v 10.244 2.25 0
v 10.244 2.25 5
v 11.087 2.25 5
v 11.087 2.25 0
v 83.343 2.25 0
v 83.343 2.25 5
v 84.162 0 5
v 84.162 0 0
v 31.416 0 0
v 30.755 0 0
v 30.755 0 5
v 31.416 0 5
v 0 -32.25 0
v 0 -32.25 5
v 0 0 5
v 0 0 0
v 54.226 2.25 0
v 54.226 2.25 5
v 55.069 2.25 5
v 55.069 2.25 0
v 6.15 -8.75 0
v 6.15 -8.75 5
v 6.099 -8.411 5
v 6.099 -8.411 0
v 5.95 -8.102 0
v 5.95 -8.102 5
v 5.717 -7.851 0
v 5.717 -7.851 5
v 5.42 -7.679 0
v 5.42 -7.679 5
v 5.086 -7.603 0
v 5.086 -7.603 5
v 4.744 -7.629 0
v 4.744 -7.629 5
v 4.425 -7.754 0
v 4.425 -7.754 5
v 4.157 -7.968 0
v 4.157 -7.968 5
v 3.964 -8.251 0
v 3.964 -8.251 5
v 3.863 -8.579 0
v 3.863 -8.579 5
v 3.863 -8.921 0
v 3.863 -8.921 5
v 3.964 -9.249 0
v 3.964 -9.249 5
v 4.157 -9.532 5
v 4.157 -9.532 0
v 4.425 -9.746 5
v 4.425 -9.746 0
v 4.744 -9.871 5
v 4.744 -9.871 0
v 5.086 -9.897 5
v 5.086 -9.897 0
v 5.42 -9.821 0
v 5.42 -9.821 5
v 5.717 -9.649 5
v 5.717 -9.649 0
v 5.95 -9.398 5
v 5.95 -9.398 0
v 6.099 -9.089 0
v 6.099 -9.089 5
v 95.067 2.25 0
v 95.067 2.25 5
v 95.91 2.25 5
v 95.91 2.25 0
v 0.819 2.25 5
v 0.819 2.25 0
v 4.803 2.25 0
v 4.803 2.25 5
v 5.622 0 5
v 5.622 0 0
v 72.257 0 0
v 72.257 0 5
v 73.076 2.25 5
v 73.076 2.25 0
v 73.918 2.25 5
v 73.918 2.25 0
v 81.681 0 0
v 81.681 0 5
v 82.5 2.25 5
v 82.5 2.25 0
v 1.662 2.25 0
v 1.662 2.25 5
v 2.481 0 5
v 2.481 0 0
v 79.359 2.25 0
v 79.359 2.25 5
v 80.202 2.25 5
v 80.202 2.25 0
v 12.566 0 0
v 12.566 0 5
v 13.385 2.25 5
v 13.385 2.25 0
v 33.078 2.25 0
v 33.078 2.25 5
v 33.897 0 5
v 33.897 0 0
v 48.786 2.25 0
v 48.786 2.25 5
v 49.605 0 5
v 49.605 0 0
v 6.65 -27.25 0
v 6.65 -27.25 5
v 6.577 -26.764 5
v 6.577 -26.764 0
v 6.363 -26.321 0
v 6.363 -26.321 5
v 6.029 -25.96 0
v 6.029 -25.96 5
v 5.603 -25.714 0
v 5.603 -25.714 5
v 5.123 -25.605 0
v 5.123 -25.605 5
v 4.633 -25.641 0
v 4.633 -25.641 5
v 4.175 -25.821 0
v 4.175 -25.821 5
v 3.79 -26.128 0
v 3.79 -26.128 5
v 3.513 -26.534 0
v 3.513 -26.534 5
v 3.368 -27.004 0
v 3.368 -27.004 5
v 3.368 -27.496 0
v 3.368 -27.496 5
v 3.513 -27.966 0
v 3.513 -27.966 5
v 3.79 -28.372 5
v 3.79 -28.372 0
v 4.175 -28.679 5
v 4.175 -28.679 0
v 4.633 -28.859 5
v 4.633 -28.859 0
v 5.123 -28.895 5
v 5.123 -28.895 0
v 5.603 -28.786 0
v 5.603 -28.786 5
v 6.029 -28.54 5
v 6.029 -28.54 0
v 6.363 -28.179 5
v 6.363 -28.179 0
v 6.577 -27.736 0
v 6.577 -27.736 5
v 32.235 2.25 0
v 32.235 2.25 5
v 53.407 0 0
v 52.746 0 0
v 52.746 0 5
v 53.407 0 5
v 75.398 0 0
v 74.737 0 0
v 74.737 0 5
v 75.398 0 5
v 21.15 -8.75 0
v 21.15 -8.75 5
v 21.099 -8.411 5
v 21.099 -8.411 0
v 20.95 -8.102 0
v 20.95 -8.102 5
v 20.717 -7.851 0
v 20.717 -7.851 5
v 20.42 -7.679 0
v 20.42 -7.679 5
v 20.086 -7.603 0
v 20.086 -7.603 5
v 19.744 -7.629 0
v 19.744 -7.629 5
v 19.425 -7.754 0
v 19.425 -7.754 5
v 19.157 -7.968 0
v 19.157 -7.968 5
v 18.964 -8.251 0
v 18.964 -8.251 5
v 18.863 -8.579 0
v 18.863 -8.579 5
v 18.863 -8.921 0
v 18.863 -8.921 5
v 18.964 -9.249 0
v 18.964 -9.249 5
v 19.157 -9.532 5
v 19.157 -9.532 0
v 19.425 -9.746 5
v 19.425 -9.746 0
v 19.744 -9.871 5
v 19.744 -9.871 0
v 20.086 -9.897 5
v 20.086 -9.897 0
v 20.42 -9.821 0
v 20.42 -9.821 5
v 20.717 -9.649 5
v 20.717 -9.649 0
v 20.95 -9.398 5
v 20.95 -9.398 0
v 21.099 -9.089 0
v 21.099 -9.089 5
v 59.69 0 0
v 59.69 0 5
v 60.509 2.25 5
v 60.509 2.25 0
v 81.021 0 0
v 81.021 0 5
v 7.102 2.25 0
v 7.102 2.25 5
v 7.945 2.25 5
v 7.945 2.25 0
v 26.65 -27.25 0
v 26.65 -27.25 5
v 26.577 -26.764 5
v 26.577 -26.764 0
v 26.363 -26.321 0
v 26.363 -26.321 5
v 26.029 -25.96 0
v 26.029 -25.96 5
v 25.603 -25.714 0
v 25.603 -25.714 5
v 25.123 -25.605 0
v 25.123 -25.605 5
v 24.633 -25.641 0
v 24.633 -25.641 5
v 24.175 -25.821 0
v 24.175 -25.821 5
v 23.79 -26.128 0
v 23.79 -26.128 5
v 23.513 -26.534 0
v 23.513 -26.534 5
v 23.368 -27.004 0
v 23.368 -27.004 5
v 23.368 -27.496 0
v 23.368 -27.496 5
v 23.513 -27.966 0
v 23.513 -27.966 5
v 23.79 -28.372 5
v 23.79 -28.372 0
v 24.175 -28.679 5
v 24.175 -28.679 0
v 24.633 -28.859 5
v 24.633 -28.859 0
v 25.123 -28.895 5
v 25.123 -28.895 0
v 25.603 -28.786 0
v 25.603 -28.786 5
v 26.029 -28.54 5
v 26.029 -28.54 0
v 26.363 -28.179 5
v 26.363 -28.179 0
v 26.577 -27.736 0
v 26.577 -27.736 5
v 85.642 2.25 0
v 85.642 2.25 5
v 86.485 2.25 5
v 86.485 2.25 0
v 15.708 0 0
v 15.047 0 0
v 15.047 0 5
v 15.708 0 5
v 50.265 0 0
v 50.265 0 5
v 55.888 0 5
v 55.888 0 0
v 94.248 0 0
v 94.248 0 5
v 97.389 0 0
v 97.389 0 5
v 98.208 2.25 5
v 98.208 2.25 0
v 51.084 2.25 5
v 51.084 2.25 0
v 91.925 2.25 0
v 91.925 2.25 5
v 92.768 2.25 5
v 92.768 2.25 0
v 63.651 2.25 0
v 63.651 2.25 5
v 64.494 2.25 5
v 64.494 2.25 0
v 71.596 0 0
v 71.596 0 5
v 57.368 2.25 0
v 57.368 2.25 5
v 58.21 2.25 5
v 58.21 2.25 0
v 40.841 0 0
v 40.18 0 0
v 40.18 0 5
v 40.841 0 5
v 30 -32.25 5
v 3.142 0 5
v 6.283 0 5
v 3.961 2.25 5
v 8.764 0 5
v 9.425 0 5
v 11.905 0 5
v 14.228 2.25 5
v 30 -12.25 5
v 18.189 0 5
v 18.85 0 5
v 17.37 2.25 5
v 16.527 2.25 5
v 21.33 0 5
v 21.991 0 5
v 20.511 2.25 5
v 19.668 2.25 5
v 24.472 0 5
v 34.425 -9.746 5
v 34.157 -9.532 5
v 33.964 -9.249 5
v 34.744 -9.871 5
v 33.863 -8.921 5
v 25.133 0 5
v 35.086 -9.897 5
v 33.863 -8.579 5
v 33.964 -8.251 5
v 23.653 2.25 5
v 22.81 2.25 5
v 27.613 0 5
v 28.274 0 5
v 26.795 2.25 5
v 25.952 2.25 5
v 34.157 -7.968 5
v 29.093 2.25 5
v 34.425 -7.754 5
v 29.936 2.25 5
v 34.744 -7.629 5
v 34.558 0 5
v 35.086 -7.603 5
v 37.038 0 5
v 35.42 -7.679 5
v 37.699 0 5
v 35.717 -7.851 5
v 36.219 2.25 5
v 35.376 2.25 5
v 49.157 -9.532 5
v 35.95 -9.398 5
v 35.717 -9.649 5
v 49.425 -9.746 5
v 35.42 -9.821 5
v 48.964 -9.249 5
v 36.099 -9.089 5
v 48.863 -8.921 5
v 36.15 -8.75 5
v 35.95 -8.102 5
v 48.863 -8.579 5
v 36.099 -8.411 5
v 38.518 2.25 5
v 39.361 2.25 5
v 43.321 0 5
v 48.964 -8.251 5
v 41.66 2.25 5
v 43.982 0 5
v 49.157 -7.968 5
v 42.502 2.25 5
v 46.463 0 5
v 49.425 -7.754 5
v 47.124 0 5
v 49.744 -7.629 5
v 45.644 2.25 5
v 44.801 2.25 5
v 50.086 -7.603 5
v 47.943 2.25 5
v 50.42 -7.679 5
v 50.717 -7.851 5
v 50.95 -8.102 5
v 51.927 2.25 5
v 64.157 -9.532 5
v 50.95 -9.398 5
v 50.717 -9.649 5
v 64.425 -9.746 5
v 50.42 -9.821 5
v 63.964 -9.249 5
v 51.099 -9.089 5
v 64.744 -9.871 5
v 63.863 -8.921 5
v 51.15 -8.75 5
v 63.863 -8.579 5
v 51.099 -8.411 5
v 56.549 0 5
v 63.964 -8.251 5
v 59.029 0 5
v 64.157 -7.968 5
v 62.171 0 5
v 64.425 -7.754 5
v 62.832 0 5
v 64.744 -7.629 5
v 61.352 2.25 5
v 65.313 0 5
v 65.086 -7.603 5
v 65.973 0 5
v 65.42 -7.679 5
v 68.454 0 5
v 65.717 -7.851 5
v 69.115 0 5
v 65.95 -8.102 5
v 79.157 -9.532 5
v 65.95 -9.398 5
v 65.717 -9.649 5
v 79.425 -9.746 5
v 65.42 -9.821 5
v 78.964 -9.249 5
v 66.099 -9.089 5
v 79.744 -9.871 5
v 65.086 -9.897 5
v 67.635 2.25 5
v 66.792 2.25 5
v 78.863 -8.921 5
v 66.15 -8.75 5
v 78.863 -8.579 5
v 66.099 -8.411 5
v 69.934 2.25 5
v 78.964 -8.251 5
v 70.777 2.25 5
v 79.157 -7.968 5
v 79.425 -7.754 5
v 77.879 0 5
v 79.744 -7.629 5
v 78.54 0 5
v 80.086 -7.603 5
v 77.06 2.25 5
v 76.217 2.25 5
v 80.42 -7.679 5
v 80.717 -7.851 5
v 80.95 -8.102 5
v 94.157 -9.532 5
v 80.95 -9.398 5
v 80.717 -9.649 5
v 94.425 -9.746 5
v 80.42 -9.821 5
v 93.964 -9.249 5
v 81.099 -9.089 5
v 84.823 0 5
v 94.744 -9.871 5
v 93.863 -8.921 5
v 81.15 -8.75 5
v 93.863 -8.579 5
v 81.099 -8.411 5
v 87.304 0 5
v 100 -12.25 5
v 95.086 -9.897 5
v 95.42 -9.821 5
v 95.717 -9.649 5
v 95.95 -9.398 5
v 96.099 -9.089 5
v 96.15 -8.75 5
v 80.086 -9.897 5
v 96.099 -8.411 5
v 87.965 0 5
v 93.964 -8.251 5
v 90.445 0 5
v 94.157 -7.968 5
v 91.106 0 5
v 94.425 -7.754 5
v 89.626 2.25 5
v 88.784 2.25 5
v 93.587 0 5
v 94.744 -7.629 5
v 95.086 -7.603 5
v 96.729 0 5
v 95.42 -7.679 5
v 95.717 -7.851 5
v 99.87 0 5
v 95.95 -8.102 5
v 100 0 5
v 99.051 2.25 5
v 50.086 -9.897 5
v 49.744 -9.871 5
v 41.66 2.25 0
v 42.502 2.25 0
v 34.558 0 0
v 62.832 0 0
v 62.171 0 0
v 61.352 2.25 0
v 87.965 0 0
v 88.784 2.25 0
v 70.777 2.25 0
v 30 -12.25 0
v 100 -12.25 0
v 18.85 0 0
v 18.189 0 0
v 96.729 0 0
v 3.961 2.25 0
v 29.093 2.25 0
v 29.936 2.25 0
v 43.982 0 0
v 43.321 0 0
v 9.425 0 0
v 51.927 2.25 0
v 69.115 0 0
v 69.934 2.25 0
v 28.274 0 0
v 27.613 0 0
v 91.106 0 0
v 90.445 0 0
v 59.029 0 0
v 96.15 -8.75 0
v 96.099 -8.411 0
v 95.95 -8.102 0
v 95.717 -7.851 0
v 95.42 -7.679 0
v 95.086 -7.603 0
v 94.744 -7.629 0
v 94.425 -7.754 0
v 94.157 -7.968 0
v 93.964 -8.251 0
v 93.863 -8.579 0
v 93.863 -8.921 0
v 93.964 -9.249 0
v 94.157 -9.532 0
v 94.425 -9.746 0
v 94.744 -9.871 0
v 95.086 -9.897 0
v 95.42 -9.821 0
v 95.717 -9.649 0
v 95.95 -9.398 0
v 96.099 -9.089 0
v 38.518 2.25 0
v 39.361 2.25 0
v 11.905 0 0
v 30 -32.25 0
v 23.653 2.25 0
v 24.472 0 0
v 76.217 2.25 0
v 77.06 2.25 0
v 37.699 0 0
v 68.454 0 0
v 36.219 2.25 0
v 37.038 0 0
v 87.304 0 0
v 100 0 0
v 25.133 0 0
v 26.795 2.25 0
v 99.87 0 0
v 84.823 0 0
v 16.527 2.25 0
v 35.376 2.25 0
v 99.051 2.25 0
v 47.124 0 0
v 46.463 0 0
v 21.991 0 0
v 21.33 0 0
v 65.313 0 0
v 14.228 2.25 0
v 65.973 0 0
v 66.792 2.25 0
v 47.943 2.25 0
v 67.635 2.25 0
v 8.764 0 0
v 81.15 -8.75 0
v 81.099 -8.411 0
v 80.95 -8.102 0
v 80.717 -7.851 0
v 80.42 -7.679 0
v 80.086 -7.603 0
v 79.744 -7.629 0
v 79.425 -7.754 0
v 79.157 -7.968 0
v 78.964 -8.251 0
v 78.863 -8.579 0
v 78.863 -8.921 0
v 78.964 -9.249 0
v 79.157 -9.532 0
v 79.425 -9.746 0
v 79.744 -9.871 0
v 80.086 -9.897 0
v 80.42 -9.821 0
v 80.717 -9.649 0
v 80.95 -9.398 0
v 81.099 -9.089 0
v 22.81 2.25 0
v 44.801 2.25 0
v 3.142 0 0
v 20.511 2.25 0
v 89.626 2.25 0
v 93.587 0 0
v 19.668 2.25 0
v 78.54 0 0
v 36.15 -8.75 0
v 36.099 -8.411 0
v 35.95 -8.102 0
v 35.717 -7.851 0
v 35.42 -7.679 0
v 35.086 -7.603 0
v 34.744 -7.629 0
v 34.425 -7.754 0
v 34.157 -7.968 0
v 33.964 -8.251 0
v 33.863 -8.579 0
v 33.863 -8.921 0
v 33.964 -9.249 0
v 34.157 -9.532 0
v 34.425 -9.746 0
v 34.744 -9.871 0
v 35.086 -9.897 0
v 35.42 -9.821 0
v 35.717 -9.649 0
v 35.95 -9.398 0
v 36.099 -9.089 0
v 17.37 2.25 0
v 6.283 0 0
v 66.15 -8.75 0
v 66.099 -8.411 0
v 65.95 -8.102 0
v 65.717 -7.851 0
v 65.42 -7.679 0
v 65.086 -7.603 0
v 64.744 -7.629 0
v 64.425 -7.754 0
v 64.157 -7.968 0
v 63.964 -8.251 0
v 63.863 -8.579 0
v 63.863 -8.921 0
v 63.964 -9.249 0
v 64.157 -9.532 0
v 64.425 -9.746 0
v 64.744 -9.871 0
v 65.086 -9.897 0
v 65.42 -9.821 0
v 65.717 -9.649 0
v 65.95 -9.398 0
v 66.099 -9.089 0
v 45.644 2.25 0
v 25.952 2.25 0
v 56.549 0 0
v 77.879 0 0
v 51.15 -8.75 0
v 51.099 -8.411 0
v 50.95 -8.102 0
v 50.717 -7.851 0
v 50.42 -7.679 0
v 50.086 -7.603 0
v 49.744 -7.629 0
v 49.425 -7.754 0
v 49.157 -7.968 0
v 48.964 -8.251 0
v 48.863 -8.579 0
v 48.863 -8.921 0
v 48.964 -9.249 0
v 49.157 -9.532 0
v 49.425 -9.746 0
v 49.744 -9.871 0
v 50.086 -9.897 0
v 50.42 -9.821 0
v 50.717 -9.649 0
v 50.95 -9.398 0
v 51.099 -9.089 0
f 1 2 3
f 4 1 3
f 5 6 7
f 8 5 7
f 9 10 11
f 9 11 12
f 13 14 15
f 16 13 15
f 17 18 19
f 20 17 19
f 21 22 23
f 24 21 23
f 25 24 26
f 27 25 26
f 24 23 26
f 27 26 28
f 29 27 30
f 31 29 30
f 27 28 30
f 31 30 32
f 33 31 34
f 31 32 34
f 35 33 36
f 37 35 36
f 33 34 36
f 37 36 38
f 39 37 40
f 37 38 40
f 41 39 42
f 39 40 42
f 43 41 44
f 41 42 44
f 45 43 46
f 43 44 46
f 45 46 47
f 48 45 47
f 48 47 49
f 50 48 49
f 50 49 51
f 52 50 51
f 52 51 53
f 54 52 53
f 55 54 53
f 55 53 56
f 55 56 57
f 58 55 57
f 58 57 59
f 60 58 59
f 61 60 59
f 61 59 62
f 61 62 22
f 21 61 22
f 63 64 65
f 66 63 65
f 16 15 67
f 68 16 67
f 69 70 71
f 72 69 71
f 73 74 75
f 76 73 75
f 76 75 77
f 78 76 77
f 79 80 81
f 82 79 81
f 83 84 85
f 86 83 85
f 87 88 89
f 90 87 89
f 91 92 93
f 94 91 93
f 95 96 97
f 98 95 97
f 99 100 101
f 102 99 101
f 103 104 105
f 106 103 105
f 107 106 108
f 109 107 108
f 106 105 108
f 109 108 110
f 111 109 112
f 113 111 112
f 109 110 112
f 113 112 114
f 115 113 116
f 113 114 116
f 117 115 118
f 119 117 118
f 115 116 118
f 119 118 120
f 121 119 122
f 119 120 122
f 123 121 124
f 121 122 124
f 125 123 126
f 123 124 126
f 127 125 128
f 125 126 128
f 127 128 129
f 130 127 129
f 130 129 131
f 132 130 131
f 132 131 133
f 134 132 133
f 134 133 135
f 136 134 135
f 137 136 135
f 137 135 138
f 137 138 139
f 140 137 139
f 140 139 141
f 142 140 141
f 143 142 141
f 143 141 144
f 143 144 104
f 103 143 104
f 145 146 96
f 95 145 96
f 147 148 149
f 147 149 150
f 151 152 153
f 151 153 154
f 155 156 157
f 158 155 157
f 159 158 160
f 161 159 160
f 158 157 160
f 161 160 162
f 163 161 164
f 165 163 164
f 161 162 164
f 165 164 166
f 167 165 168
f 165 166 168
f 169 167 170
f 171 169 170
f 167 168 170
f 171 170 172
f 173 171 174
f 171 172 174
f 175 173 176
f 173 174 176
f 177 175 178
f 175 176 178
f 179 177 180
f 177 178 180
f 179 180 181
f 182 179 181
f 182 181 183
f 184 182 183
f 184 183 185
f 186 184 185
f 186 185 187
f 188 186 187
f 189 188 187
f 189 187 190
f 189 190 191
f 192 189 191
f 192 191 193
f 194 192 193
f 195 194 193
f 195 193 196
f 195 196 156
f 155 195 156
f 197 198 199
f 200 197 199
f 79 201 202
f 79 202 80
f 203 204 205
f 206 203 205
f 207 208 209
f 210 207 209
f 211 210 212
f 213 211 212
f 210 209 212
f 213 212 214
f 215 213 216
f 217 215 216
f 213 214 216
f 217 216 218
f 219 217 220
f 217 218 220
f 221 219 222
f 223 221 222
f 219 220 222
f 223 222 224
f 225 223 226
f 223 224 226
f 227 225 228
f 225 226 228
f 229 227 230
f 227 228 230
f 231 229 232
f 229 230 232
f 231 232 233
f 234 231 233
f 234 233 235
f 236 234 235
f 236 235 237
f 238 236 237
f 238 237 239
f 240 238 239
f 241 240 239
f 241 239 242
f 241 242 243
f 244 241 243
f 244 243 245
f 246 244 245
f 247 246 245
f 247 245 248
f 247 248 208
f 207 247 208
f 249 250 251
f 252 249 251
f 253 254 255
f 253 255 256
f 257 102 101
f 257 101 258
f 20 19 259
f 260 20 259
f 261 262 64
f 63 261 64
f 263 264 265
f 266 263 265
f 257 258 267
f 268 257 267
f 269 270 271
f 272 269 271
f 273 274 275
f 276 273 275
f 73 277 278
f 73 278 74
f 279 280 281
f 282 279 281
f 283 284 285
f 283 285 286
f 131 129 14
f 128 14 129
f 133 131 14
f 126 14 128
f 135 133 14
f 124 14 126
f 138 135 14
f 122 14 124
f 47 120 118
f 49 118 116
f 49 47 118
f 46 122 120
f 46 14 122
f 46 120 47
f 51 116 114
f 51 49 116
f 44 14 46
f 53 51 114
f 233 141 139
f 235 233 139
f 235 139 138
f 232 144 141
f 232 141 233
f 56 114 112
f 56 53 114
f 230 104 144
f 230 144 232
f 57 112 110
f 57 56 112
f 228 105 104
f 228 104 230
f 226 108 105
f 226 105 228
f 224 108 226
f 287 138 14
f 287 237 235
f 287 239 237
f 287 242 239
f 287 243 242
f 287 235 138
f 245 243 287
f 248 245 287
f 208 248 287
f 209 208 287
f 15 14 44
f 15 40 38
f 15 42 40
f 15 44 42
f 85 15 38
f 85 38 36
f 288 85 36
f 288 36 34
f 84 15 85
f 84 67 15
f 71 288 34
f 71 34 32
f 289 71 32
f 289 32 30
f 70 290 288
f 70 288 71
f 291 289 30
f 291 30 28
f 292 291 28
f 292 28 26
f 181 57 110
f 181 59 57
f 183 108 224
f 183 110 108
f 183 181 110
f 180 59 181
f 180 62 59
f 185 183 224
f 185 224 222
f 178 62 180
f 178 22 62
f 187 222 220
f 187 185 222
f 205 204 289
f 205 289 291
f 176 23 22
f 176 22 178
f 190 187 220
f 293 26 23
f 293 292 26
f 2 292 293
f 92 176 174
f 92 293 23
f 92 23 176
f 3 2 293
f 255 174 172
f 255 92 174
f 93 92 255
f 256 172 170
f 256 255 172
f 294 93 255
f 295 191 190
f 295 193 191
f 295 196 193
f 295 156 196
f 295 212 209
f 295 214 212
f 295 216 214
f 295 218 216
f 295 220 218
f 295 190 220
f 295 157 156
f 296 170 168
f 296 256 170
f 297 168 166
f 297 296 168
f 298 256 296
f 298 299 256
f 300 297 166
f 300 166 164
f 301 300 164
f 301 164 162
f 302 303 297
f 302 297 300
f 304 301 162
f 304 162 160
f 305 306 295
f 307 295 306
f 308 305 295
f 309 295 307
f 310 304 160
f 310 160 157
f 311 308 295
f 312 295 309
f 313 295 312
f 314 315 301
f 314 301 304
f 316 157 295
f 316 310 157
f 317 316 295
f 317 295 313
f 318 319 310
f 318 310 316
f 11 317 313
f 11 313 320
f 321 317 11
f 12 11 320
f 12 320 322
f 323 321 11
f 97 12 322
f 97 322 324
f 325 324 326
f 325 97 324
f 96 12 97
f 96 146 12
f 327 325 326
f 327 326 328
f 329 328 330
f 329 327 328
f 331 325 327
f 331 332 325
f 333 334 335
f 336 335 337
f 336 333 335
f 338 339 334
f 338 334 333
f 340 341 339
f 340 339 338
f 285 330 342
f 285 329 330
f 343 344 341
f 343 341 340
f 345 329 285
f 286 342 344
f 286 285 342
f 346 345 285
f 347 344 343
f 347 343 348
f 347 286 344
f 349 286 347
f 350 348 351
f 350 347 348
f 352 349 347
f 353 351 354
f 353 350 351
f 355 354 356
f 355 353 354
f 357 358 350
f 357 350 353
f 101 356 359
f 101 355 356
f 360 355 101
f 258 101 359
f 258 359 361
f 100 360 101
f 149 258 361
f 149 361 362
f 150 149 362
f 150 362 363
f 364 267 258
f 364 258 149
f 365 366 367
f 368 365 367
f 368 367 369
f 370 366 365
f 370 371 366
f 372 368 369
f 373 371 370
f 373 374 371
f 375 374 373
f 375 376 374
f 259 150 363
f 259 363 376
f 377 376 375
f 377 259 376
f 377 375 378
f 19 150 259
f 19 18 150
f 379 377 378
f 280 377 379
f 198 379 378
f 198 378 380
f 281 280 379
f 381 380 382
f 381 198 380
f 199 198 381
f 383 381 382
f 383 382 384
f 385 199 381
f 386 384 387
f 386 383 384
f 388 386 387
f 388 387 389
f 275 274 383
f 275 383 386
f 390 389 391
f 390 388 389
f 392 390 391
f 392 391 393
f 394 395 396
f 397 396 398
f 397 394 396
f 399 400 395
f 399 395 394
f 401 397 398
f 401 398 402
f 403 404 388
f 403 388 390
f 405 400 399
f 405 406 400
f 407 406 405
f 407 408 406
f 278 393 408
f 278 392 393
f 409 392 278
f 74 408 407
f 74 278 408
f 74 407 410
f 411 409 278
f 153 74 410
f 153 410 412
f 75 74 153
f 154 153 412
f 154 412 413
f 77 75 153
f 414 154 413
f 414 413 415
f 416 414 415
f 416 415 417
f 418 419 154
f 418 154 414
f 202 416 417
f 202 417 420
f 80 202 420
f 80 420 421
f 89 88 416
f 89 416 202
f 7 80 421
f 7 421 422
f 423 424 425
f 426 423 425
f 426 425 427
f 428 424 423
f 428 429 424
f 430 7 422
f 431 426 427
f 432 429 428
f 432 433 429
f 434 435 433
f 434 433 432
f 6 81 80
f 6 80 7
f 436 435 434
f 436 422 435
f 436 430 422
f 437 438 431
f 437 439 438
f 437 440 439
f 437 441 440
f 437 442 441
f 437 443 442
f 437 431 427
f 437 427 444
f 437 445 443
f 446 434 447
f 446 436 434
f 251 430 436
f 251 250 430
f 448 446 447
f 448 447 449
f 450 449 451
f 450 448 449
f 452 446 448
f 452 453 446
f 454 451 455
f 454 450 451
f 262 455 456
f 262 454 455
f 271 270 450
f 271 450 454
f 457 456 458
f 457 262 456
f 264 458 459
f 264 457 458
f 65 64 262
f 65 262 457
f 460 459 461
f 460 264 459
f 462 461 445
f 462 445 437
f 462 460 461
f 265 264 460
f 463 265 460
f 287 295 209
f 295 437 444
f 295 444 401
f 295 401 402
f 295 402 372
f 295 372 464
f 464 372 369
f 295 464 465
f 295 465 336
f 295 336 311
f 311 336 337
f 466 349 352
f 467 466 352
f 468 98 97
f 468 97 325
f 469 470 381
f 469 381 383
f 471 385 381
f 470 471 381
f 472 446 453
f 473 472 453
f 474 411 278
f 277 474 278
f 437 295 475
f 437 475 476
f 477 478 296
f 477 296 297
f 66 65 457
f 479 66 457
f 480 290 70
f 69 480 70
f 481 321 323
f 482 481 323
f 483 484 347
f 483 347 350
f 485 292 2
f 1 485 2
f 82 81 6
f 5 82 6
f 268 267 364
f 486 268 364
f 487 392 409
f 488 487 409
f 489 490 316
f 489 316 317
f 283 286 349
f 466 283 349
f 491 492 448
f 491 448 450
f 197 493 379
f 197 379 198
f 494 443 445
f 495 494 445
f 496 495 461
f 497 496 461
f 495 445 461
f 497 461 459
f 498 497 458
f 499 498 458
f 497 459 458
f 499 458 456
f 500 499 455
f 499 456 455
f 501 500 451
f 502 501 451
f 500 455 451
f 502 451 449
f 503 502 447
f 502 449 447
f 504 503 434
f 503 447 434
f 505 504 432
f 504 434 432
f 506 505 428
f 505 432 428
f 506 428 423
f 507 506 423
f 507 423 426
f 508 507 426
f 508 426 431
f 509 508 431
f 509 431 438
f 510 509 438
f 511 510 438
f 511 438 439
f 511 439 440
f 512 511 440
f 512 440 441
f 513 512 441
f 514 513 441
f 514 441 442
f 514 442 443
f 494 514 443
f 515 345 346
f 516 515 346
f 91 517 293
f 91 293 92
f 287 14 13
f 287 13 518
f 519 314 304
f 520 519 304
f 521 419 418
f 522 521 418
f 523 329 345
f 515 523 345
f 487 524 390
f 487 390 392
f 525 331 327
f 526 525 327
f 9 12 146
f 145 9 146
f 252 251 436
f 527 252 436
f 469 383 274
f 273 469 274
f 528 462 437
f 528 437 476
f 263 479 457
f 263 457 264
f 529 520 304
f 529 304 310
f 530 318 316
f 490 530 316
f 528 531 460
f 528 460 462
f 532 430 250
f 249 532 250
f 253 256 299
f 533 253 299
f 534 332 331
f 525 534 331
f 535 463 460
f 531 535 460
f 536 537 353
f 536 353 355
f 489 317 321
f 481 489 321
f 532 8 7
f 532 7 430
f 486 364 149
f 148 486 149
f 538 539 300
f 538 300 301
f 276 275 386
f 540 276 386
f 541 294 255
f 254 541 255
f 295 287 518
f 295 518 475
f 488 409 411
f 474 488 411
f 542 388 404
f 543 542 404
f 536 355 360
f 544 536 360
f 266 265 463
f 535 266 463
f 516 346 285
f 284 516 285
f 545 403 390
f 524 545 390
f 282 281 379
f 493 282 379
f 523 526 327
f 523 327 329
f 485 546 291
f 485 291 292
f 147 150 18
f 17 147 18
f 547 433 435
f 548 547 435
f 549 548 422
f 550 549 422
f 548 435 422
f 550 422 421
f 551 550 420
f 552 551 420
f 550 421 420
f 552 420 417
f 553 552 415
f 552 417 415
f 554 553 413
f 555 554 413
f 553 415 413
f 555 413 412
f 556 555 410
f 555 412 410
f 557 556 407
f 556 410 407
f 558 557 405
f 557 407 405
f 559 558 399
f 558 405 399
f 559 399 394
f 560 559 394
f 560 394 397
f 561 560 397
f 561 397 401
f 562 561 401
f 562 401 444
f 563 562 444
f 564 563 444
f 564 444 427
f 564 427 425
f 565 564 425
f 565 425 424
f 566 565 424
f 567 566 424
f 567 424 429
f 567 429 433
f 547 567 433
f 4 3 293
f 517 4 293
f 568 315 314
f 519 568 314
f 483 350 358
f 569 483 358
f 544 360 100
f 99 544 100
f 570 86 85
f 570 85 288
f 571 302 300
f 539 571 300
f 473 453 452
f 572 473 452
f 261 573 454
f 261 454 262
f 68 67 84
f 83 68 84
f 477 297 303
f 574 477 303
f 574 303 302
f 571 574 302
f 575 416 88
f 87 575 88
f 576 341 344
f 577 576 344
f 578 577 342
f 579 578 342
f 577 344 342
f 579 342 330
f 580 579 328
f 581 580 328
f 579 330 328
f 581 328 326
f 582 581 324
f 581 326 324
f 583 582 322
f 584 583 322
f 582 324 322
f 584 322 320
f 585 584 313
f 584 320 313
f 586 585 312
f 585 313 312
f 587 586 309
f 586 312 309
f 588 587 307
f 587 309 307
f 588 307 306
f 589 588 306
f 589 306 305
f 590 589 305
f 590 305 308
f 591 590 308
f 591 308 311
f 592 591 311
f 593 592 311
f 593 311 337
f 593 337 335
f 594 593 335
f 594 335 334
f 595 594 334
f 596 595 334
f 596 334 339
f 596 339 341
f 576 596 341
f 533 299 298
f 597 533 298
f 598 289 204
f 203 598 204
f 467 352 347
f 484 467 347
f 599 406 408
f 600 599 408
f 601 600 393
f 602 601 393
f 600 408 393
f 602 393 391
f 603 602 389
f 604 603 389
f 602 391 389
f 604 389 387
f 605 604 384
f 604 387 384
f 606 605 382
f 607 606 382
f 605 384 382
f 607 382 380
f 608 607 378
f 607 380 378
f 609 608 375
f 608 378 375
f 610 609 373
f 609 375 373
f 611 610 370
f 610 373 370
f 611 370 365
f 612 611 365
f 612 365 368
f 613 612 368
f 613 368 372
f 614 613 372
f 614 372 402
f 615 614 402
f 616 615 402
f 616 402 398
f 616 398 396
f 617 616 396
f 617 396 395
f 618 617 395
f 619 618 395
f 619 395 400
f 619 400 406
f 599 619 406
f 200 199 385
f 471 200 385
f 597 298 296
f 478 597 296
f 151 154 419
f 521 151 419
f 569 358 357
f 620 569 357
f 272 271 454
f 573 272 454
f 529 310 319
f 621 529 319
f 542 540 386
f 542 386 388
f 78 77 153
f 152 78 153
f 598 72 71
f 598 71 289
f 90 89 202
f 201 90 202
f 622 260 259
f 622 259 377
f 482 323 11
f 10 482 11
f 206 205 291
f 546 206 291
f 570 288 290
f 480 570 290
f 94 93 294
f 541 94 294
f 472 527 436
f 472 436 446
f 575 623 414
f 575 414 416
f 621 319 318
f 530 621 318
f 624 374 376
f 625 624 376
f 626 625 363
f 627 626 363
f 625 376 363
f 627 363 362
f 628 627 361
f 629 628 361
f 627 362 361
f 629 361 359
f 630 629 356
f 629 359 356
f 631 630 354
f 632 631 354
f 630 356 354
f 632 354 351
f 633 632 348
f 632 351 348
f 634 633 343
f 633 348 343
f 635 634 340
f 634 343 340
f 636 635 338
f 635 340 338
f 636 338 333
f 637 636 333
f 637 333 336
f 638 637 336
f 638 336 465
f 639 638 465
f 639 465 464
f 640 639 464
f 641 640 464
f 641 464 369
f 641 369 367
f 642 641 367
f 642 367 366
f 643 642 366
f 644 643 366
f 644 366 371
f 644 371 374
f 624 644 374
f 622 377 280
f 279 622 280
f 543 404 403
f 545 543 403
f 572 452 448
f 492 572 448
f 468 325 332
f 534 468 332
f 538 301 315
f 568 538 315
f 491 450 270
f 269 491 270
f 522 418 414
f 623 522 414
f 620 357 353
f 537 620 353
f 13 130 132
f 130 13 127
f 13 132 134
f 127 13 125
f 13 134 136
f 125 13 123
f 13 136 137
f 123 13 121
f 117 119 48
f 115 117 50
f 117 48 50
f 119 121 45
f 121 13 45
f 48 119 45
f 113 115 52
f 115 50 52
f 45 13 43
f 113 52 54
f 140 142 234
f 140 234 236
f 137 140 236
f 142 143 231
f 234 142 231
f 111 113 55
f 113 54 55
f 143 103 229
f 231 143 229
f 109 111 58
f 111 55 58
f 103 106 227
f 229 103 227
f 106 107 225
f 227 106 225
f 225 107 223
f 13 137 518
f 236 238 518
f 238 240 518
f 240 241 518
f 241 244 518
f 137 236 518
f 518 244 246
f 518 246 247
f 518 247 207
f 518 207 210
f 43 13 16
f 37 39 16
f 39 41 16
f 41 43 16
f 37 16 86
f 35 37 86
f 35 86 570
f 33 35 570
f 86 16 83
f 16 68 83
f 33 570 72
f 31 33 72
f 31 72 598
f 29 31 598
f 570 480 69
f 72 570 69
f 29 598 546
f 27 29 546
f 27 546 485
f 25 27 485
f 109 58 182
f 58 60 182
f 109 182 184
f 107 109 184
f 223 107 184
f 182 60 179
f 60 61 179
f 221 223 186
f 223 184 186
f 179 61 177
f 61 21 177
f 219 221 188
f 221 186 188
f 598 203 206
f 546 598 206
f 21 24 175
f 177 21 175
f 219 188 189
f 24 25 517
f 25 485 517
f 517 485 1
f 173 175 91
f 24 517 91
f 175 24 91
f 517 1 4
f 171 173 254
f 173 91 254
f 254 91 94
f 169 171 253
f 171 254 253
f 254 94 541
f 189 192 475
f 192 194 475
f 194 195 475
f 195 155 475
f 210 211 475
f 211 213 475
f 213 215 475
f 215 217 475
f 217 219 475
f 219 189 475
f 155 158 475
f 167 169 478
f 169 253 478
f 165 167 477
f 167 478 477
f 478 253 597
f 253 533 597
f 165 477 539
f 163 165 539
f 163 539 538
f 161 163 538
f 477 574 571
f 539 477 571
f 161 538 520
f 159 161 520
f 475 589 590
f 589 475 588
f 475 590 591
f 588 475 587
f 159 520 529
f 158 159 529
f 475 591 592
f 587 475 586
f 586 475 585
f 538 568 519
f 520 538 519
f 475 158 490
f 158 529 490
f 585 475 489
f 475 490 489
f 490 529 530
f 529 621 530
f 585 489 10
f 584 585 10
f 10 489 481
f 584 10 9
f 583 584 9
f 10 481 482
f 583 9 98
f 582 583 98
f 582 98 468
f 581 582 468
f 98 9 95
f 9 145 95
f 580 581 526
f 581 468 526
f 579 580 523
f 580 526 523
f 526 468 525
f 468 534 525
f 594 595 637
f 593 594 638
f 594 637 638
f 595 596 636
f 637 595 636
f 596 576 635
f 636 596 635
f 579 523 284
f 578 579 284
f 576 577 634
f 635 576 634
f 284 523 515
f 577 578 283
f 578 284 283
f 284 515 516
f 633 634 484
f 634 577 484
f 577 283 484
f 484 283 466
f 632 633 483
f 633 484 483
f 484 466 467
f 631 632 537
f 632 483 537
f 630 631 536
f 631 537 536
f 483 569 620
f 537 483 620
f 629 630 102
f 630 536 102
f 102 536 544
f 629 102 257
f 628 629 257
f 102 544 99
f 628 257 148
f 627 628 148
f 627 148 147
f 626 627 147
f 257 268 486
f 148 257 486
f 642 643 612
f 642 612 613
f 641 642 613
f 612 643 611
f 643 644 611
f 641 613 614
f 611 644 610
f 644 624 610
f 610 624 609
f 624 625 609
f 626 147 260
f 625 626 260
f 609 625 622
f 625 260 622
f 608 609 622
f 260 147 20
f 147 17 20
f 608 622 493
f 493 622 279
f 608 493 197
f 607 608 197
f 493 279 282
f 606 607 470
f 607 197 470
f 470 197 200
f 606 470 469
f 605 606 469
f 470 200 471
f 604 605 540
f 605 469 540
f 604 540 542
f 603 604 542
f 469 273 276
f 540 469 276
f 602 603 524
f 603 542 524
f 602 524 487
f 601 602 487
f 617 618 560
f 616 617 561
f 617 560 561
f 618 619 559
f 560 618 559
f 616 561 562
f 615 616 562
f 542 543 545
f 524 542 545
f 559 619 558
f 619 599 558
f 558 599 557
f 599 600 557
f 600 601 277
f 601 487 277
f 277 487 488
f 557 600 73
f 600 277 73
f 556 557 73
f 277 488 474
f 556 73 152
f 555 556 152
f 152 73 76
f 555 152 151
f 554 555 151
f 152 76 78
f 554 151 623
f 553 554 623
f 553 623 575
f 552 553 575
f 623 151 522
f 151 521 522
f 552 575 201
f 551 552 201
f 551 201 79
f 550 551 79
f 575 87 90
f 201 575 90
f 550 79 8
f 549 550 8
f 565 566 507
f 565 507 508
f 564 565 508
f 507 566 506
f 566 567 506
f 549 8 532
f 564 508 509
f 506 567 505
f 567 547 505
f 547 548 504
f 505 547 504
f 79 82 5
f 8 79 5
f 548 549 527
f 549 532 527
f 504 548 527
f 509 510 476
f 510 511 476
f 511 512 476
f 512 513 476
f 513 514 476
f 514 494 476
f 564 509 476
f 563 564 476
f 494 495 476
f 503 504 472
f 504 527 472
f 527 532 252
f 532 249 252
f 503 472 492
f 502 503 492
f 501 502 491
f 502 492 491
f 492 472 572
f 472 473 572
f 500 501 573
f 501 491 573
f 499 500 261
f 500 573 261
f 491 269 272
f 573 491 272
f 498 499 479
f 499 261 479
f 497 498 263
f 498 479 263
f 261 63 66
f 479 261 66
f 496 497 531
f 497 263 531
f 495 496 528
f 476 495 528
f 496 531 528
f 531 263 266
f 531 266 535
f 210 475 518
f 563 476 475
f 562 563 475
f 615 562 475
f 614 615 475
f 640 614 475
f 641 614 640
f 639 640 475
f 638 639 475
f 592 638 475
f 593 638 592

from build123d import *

# Parameters (mm, degrees)
SKETCH1_W           = 106.814150222
SKETCH1_H           = 8
EXTRUDE1_DEPTH      = 5
EXTRUDE2_DEPTH      = 5
LPATTERN1_COUNT     = 34
LPATTERN1_PITCH     = 3.141592654
SKETCH_2_W          = 106.814150222
SKETCH_2_H          = 5
EXTRUDE_1_DEPTH     = 4.25
SKETCH_3_W          = 5
SKETCH_3_H          = 17.759873191
CUT_EXTRUDE_1_DEPTH = 6.814150222
SKETCH_4_R          = 1.15
CUT_EXTRUDE_2_DEPTH = 101.87151481
SKETCH_5_W          = 30
SKETCH_5_H          = 20
EXTRUDE_2_DEPTH     = 5
SKETCH_6_R          = 1.65
CUT_EXTRUDE_3_DEPTH = 13


with BuildPart() as part:
    # Sketch1 → Extrude1 (new body)
    with BuildSketch(Plane.XY):
        with Locations((53.407075111, -4)):
            Rectangle(SKETCH1_W, SKETCH1_H)
    extrude(amount=EXTRUDE1_DEPTH)

    # Sketch2 → Extrude2 (add)
    with BuildSketch(Plane.XY.offset(5)):
        Polygon((0, 0), (0.818933027, 2.25), (1.661788885, 2.25), (2.480721912, 0), align=None)
    extrude2 = extrude(amount=-EXTRUDE2_DEPTH)

    # LPattern1: Extrude2 ×34
    with Locations(*[(i * LPATTERN1_PITCH, 0, 0) for i in range(1, LPATTERN1_COUNT)]):
        add(extrude2)

    # 草图2 → 凸台-拉伸1 (add)
    with BuildSketch(Plane.XZ.offset(8)):
        with Locations((53.407075111, 2.5)):
            Rectangle(SKETCH_2_W, SKETCH_2_H)
    extrude(amount=EXTRUDE_1_DEPTH)

    # 草图3 → 切除-拉伸1 (cut)
    with BuildSketch(Plane(origin=(106.814150222, 0, 0), x_dir=(0, 0, -1), z_dir=(1, 0, 0))):
        with Locations((-2.5, -3.370063404)):
            Rectangle(SKETCH_3_W, SKETCH_3_H)
    extrude(amount=-CUT_EXTRUDE_1_DEPTH, mode=Mode.SUBTRACT)

    # 草图4 → 切除-拉伸2 (cut, through all)
    with BuildSketch(Plane.XY.offset(5)):
        with Locations((5, -8.75)):
            Circle(SKETCH_4_R)
        with Locations((20, -8.75)):
            Circle(SKETCH_4_R)
        with Locations((35, -8.75)):
            Circle(SKETCH_4_R)
        with Locations((50, -8.75)):
            Circle(SKETCH_4_R)
        with Locations((65, -8.75)):
            Circle(SKETCH_4_R)
        with Locations((80, -8.75)):
            Circle(SKETCH_4_R)
        with Locations((95, -8.75)):
            Circle(SKETCH_4_R)
    extrude(amount=-CUT_EXTRUDE_2_DEPTH, mode=Mode.SUBTRACT)

    # 草图5 → 凸台-拉伸2 (add)
    with BuildSketch(Plane.XY.offset(5)):
        with Locations((15, -22.25)):
            Rectangle(SKETCH_5_W, SKETCH_5_H)
    extrude(amount=-EXTRUDE_2_DEPTH)

    # 草图6 → 切除-拉伸3 (cut)
    with BuildSketch(Plane.XY.offset(5)):
        with Locations((25, -27.25)):
            Circle(SKETCH_6_R)
        with Locations((5, -27.25)):
            Circle(SKETCH_6_R)
    extrude(amount=-CUT_EXTRUDE_3_DEPTH, mode=Mode.SUBTRACT)


solid = part.part
